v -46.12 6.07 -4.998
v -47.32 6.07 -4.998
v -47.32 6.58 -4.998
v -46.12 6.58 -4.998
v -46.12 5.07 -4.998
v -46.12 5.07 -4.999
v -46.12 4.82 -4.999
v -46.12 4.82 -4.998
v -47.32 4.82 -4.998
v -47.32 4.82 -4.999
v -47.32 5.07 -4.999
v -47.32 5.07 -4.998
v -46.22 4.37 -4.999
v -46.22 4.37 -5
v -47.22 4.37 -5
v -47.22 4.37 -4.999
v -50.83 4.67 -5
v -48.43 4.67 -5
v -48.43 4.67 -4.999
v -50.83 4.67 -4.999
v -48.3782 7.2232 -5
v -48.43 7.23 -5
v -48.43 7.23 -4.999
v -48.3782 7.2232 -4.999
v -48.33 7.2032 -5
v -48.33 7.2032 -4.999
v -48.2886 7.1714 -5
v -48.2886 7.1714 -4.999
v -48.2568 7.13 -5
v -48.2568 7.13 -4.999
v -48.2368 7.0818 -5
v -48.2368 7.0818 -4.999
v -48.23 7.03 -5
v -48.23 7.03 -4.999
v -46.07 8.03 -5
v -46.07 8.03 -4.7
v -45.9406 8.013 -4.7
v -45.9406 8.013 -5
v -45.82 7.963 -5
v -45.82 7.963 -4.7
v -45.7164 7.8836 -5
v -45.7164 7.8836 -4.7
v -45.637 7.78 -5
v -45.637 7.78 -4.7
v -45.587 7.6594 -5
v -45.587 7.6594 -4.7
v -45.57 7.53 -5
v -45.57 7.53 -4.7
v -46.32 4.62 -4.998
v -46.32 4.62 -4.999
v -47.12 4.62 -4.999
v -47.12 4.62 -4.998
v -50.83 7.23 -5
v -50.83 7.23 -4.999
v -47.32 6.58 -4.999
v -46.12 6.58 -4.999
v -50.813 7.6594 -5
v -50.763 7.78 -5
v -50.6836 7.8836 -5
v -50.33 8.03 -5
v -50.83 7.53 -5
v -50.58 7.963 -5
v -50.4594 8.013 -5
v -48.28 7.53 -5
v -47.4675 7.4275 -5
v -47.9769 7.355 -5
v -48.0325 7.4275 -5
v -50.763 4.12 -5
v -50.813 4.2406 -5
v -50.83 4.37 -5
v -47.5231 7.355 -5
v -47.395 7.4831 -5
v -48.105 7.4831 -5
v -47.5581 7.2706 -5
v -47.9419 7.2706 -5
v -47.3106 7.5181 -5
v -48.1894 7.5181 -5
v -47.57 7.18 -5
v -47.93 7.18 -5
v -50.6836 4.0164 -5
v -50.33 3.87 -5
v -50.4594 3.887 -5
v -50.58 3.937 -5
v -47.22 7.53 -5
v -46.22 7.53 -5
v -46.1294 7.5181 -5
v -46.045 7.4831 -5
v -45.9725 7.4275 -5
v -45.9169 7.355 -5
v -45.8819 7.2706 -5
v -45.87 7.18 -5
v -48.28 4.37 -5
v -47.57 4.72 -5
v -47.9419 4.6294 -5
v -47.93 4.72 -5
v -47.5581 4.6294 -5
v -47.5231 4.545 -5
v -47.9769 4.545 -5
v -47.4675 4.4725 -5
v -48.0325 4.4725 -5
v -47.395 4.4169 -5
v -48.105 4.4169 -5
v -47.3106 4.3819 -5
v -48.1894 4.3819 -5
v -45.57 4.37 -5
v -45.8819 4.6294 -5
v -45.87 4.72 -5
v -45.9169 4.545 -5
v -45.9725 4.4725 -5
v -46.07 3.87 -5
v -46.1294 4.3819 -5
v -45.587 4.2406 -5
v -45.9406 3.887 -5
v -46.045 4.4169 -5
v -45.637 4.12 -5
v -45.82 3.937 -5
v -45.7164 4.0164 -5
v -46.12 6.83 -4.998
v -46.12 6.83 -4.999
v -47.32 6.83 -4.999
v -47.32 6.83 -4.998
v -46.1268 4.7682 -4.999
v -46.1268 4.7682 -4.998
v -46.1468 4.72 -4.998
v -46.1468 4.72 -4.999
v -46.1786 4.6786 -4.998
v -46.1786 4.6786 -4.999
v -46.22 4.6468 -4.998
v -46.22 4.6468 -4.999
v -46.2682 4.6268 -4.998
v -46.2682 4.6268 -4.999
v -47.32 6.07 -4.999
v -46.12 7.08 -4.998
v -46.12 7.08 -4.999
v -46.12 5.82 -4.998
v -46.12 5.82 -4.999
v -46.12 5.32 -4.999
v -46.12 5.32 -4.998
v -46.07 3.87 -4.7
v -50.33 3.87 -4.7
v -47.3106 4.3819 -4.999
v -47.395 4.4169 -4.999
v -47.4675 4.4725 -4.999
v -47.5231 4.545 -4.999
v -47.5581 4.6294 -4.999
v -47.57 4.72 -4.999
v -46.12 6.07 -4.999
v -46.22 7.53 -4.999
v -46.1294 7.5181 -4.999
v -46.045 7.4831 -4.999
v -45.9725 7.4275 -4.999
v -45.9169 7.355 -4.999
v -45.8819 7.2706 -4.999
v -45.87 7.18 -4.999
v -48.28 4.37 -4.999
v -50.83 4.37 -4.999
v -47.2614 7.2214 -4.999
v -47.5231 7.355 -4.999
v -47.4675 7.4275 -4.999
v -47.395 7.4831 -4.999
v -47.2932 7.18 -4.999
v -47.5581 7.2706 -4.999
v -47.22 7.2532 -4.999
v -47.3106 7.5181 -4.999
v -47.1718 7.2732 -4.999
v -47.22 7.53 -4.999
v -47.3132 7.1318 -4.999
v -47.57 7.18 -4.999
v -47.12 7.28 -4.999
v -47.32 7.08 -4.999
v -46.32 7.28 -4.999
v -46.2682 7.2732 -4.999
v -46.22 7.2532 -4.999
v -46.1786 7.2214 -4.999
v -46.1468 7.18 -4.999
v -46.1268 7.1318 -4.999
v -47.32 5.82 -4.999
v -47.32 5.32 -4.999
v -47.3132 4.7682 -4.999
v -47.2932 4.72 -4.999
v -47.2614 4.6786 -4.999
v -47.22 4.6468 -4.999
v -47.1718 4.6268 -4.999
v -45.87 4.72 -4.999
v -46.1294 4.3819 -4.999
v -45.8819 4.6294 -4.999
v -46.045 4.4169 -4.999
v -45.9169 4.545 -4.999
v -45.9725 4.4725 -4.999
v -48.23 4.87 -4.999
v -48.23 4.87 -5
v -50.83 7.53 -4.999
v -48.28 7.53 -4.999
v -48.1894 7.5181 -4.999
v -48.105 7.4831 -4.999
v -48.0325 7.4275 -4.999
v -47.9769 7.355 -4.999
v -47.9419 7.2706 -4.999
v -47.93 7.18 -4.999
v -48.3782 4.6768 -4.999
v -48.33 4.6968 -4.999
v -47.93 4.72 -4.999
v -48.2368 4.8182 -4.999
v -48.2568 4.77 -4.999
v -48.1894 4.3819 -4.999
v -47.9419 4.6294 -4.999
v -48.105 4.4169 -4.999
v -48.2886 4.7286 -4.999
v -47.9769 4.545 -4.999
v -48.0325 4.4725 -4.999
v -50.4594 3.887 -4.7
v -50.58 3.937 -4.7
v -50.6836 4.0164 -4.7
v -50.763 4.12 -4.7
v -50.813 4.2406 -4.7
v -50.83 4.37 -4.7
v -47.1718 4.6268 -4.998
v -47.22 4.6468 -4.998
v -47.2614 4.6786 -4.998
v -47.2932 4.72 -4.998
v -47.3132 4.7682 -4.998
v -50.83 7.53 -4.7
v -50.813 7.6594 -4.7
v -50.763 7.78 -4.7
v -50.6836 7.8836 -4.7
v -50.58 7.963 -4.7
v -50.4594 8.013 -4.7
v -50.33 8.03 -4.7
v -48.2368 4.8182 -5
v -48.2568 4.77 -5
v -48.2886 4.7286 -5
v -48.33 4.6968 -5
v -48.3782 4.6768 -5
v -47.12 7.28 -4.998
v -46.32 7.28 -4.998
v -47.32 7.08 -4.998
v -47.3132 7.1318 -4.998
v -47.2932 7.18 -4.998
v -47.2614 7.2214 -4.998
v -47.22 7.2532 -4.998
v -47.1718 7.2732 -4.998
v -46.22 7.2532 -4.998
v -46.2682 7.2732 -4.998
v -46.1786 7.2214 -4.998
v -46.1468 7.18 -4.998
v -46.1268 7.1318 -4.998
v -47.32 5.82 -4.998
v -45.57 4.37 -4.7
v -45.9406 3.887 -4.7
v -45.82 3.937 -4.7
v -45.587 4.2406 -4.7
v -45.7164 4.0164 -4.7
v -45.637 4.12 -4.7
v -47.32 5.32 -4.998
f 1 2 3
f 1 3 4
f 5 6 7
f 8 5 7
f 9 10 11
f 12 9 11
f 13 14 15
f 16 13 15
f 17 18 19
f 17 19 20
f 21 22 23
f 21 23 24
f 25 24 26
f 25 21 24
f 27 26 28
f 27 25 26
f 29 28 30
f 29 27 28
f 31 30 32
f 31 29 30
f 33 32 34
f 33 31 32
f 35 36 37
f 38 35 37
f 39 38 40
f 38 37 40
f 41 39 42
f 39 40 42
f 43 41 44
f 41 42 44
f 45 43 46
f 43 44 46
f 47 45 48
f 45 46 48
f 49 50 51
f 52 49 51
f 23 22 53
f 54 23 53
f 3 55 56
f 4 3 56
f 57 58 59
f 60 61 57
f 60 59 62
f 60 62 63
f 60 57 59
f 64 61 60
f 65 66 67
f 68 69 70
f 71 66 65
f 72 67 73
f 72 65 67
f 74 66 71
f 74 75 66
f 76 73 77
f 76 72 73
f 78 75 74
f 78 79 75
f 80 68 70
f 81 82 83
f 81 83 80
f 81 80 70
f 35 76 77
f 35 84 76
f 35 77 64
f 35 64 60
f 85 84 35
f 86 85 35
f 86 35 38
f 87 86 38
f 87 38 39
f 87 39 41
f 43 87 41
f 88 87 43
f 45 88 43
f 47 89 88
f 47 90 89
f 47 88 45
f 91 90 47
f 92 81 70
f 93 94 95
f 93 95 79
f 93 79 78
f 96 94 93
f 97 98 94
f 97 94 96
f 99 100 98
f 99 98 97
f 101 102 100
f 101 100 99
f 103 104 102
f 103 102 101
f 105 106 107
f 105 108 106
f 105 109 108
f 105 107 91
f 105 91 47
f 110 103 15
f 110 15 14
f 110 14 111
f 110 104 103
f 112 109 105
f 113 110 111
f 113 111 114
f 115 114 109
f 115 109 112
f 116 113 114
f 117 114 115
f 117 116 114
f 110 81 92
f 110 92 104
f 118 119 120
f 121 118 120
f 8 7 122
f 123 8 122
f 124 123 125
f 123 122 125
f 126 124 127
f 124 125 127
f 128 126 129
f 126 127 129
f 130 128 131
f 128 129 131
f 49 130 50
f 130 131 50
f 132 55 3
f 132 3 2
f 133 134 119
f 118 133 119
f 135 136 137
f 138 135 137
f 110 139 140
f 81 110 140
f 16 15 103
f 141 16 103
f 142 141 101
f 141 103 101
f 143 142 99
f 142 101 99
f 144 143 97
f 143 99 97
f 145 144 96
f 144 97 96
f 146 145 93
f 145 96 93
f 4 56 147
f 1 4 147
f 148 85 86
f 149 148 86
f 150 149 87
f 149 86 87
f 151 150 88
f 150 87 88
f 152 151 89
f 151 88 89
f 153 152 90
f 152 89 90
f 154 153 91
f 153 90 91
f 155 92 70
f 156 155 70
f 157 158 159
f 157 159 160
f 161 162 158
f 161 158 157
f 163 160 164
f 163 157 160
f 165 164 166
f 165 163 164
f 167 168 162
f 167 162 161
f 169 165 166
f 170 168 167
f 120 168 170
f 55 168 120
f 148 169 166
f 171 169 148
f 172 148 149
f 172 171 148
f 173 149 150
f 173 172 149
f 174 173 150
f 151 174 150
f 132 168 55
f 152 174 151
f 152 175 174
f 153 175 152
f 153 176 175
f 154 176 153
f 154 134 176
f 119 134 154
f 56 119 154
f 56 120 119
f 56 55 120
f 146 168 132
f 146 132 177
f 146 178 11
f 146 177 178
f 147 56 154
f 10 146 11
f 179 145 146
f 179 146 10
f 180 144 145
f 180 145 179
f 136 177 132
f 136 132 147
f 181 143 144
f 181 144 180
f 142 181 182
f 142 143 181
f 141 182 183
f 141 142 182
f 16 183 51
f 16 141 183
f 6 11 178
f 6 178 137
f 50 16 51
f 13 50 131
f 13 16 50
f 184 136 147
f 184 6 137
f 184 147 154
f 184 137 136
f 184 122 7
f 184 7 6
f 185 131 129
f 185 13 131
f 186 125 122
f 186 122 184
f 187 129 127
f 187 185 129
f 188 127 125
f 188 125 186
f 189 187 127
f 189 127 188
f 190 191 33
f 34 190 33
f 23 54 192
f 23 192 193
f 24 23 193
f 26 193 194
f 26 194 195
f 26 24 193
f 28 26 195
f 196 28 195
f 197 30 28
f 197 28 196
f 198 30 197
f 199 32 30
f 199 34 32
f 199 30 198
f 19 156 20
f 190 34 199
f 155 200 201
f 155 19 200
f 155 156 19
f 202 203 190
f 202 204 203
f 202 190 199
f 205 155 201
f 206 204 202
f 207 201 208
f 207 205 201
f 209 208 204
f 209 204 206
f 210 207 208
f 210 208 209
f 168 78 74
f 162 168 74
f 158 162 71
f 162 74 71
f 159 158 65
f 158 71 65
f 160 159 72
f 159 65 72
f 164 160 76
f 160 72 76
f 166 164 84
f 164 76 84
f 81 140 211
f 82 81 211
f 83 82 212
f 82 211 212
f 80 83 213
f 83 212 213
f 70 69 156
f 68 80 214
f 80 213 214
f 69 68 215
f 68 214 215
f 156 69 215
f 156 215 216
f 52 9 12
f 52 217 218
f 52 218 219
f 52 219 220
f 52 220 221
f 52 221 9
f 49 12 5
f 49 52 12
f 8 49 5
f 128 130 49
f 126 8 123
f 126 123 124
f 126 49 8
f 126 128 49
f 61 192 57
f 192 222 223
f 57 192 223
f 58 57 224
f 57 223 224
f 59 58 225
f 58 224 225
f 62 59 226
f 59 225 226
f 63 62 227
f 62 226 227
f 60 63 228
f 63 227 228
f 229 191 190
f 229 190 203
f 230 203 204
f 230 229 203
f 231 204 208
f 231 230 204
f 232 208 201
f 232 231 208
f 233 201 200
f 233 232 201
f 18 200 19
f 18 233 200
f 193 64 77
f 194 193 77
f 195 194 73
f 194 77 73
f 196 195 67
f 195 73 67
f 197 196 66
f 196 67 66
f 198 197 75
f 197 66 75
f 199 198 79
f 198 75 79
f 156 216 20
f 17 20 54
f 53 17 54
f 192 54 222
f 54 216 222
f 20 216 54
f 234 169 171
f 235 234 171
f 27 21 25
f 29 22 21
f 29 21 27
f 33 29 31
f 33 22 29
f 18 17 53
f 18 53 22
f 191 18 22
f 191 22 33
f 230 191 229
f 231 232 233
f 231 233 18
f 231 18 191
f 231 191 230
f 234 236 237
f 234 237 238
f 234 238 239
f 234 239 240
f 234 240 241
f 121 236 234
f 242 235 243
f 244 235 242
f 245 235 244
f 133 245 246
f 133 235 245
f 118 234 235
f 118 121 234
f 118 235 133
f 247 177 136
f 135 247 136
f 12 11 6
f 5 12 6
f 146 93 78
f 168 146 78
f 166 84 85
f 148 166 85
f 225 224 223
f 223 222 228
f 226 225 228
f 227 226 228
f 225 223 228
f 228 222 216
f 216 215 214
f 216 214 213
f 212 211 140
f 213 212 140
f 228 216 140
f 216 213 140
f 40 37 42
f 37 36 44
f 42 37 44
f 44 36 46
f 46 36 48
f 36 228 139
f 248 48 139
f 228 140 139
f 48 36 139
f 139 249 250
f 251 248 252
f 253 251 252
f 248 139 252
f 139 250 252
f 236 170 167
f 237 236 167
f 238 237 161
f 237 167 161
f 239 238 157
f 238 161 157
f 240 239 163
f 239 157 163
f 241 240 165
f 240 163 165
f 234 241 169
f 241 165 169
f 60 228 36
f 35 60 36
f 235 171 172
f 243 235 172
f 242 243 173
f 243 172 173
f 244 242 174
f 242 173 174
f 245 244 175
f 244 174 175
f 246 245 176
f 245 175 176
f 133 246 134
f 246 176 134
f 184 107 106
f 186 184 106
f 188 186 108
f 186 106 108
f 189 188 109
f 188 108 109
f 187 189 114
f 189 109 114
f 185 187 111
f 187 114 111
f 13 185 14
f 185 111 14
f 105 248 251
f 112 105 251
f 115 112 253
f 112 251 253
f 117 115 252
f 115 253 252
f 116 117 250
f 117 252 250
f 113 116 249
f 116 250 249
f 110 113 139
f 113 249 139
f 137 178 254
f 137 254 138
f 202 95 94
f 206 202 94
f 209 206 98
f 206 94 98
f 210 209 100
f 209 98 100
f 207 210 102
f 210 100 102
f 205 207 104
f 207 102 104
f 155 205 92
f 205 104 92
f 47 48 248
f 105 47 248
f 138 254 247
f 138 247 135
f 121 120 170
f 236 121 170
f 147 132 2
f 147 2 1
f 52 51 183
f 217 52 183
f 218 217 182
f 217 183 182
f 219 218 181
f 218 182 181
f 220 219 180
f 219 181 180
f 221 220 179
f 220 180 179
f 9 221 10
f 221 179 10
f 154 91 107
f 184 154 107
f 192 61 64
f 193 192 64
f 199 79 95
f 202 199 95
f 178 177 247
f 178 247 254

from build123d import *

# Parameters (mm, degrees)
PAD008_DEPTH    = 0.3
POCKET024_DEPTH = 0.001
SKETCH035_W     = 1.2
SKETCH035_H     = 0.51
SKETCH035_H_2   = 0.5
POCKET025_DEPTH = 0.001


with BuildPart() as part:
    # Sketch033 (on Face1 of Binder008) → Pad008 (new body)
    with BuildSketch(Plane(origin=(0, 0, -4.7), x_dir=(1, 0, 0), z_dir=(0, 0, -1))):
        with BuildLine():
            Line((-50.83, -4.37), (-50.83, -7.53))
            ThreePointArc((-50.83, -7.53), (-50.683553, -7.883553), (-50.33, -8.03))
            Line((-50.33, -8.03), (-46.07, -8.03))
            ThreePointArc((-46.07, -8.03), (-45.716447, -7.883553), (-45.57, -7.53))
            Line((-45.57, -7.53), (-45.57, -4.37))
            ThreePointArc((-45.57, -4.37), (-45.716447, -4.016447), (-46.07, -3.87))
            Line((-46.07, -3.87), (-50.33, -3.87))
            ThreePointArc((-50.33, -3.87), (-50.683553, -4.016447), (-50.83, -4.37))
        make_face()
    extrude(amount=PAD008_DEPTH)

    # Sketch034 (on Face10 of Pad008) → Pocket024 (cut)
    with BuildSketch(Plane(origin=(0, 0, -5), x_dir=(1, 0, 0), z_dir=(0, 0, -1))):
        with BuildLine():
            Line((-48.23, -4.87), (-48.23, -7.03))
            ThreePointArc((-48.43, -7.23), (-48.288579, -7.171421), (-48.23, -7.03))
            Line((-48.43, -7.23), (-50.83, -7.23))
            Line((-50.83, -7.23), (-50.83, -7.53))
            Line((-50.83, -7.53), (-48.28, -7.53))
            ThreePointArc((-48.28, -7.53), (-48.032513, -7.427487), (-47.93, -7.18))
            Line((-47.93, -7.18), (-47.93, -4.72))
            ThreePointArc((-47.93, -4.72), (-48.032513, -4.472513), (-48.28, -4.37))
            Line((-48.28, -4.37), (-50.83, -4.37))
            Line((-50.83, -4.67), (-50.83, -4.37))
            Line((-48.43, -4.67), (-50.83, -4.67))
            ThreePointArc((-48.23, -4.87), (-48.288579, -4.728579), (-48.43, -4.67))
        make_face()
        with BuildLine():
            Line((-47.57, -4.72), (-47.57, -7.18))
            ThreePointArc((-47.57, -7.18), (-47.467487, -7.427487), (-47.22, -7.53))
            Line((-47.22, -7.53), (-46.22, -7.53))
            ThreePointArc((-46.22, -7.53), (-45.972513, -7.427487), (-45.87, -7.18))
            Line((-45.87, -7.18), (-45.87, -4.72))
            ThreePointArc((-45.87, -4.72), (-45.972513, -4.472513), (-46.22, -4.37))
            Line((-46.22, -4.37), (-47.22, -4.37))
            ThreePointArc((-47.22, -4.37), (-47.467487, -4.472513), (-47.57, -4.72))
        make_face()
    extrude(amount=-POCKET024_DEPTH, mode=Mode.SUBTRACT)

    # Sketch035 (on Face31 of Pocket024) → Pocket025 (cut)
    with BuildSketch(Plane(origin=(0, 0, -4.999), x_dir=(1, 0, 0), z_dir=(0, 0, -1))):
        with BuildLine():
            Line((-47.32, -6.83), (-47.32, -7.08))
            ThreePointArc((-47.32, -7.08), (-47.261421, -7.221421), (-47.12, -7.28))
            Line((-47.12, -7.28), (-46.32, -7.28))
            ThreePointArc((-46.32, -7.28), (-46.178579, -7.221421), (-46.12, -7.08))
            Line((-46.12, -7.08), (-46.12, -6.83))
            Line((-46.12, -6.83), (-47.32, -6.83))
        make_face()
        with Locations((-46.72, -6.325)):
            Rectangle(SKETCH035_W, SKETCH035_H)
        with Locations((-46.72, -5.57)):
            Rectangle(SKETCH035_W, SKETCH035_H_2)
        with BuildLine():
            Line((-47.32, -4.82), (-47.32, -5.07))
            Line((-47.32, -5.07), (-46.12, -5.07))
            Line((-46.12, -5.07), (-46.12, -4.82))
            ThreePointArc((-46.12, -4.82), (-46.178579, -4.678579), (-46.32, -4.62))
            Line((-46.32, -4.62), (-47.12, -4.62))
            ThreePointArc((-47.12, -4.62), (-47.261421, -4.678579), (-47.32, -4.82))
        make_face()
    extrude(amount=-POCKET025_DEPTH, mode=Mode.SUBTRACT)


solid = part.part
